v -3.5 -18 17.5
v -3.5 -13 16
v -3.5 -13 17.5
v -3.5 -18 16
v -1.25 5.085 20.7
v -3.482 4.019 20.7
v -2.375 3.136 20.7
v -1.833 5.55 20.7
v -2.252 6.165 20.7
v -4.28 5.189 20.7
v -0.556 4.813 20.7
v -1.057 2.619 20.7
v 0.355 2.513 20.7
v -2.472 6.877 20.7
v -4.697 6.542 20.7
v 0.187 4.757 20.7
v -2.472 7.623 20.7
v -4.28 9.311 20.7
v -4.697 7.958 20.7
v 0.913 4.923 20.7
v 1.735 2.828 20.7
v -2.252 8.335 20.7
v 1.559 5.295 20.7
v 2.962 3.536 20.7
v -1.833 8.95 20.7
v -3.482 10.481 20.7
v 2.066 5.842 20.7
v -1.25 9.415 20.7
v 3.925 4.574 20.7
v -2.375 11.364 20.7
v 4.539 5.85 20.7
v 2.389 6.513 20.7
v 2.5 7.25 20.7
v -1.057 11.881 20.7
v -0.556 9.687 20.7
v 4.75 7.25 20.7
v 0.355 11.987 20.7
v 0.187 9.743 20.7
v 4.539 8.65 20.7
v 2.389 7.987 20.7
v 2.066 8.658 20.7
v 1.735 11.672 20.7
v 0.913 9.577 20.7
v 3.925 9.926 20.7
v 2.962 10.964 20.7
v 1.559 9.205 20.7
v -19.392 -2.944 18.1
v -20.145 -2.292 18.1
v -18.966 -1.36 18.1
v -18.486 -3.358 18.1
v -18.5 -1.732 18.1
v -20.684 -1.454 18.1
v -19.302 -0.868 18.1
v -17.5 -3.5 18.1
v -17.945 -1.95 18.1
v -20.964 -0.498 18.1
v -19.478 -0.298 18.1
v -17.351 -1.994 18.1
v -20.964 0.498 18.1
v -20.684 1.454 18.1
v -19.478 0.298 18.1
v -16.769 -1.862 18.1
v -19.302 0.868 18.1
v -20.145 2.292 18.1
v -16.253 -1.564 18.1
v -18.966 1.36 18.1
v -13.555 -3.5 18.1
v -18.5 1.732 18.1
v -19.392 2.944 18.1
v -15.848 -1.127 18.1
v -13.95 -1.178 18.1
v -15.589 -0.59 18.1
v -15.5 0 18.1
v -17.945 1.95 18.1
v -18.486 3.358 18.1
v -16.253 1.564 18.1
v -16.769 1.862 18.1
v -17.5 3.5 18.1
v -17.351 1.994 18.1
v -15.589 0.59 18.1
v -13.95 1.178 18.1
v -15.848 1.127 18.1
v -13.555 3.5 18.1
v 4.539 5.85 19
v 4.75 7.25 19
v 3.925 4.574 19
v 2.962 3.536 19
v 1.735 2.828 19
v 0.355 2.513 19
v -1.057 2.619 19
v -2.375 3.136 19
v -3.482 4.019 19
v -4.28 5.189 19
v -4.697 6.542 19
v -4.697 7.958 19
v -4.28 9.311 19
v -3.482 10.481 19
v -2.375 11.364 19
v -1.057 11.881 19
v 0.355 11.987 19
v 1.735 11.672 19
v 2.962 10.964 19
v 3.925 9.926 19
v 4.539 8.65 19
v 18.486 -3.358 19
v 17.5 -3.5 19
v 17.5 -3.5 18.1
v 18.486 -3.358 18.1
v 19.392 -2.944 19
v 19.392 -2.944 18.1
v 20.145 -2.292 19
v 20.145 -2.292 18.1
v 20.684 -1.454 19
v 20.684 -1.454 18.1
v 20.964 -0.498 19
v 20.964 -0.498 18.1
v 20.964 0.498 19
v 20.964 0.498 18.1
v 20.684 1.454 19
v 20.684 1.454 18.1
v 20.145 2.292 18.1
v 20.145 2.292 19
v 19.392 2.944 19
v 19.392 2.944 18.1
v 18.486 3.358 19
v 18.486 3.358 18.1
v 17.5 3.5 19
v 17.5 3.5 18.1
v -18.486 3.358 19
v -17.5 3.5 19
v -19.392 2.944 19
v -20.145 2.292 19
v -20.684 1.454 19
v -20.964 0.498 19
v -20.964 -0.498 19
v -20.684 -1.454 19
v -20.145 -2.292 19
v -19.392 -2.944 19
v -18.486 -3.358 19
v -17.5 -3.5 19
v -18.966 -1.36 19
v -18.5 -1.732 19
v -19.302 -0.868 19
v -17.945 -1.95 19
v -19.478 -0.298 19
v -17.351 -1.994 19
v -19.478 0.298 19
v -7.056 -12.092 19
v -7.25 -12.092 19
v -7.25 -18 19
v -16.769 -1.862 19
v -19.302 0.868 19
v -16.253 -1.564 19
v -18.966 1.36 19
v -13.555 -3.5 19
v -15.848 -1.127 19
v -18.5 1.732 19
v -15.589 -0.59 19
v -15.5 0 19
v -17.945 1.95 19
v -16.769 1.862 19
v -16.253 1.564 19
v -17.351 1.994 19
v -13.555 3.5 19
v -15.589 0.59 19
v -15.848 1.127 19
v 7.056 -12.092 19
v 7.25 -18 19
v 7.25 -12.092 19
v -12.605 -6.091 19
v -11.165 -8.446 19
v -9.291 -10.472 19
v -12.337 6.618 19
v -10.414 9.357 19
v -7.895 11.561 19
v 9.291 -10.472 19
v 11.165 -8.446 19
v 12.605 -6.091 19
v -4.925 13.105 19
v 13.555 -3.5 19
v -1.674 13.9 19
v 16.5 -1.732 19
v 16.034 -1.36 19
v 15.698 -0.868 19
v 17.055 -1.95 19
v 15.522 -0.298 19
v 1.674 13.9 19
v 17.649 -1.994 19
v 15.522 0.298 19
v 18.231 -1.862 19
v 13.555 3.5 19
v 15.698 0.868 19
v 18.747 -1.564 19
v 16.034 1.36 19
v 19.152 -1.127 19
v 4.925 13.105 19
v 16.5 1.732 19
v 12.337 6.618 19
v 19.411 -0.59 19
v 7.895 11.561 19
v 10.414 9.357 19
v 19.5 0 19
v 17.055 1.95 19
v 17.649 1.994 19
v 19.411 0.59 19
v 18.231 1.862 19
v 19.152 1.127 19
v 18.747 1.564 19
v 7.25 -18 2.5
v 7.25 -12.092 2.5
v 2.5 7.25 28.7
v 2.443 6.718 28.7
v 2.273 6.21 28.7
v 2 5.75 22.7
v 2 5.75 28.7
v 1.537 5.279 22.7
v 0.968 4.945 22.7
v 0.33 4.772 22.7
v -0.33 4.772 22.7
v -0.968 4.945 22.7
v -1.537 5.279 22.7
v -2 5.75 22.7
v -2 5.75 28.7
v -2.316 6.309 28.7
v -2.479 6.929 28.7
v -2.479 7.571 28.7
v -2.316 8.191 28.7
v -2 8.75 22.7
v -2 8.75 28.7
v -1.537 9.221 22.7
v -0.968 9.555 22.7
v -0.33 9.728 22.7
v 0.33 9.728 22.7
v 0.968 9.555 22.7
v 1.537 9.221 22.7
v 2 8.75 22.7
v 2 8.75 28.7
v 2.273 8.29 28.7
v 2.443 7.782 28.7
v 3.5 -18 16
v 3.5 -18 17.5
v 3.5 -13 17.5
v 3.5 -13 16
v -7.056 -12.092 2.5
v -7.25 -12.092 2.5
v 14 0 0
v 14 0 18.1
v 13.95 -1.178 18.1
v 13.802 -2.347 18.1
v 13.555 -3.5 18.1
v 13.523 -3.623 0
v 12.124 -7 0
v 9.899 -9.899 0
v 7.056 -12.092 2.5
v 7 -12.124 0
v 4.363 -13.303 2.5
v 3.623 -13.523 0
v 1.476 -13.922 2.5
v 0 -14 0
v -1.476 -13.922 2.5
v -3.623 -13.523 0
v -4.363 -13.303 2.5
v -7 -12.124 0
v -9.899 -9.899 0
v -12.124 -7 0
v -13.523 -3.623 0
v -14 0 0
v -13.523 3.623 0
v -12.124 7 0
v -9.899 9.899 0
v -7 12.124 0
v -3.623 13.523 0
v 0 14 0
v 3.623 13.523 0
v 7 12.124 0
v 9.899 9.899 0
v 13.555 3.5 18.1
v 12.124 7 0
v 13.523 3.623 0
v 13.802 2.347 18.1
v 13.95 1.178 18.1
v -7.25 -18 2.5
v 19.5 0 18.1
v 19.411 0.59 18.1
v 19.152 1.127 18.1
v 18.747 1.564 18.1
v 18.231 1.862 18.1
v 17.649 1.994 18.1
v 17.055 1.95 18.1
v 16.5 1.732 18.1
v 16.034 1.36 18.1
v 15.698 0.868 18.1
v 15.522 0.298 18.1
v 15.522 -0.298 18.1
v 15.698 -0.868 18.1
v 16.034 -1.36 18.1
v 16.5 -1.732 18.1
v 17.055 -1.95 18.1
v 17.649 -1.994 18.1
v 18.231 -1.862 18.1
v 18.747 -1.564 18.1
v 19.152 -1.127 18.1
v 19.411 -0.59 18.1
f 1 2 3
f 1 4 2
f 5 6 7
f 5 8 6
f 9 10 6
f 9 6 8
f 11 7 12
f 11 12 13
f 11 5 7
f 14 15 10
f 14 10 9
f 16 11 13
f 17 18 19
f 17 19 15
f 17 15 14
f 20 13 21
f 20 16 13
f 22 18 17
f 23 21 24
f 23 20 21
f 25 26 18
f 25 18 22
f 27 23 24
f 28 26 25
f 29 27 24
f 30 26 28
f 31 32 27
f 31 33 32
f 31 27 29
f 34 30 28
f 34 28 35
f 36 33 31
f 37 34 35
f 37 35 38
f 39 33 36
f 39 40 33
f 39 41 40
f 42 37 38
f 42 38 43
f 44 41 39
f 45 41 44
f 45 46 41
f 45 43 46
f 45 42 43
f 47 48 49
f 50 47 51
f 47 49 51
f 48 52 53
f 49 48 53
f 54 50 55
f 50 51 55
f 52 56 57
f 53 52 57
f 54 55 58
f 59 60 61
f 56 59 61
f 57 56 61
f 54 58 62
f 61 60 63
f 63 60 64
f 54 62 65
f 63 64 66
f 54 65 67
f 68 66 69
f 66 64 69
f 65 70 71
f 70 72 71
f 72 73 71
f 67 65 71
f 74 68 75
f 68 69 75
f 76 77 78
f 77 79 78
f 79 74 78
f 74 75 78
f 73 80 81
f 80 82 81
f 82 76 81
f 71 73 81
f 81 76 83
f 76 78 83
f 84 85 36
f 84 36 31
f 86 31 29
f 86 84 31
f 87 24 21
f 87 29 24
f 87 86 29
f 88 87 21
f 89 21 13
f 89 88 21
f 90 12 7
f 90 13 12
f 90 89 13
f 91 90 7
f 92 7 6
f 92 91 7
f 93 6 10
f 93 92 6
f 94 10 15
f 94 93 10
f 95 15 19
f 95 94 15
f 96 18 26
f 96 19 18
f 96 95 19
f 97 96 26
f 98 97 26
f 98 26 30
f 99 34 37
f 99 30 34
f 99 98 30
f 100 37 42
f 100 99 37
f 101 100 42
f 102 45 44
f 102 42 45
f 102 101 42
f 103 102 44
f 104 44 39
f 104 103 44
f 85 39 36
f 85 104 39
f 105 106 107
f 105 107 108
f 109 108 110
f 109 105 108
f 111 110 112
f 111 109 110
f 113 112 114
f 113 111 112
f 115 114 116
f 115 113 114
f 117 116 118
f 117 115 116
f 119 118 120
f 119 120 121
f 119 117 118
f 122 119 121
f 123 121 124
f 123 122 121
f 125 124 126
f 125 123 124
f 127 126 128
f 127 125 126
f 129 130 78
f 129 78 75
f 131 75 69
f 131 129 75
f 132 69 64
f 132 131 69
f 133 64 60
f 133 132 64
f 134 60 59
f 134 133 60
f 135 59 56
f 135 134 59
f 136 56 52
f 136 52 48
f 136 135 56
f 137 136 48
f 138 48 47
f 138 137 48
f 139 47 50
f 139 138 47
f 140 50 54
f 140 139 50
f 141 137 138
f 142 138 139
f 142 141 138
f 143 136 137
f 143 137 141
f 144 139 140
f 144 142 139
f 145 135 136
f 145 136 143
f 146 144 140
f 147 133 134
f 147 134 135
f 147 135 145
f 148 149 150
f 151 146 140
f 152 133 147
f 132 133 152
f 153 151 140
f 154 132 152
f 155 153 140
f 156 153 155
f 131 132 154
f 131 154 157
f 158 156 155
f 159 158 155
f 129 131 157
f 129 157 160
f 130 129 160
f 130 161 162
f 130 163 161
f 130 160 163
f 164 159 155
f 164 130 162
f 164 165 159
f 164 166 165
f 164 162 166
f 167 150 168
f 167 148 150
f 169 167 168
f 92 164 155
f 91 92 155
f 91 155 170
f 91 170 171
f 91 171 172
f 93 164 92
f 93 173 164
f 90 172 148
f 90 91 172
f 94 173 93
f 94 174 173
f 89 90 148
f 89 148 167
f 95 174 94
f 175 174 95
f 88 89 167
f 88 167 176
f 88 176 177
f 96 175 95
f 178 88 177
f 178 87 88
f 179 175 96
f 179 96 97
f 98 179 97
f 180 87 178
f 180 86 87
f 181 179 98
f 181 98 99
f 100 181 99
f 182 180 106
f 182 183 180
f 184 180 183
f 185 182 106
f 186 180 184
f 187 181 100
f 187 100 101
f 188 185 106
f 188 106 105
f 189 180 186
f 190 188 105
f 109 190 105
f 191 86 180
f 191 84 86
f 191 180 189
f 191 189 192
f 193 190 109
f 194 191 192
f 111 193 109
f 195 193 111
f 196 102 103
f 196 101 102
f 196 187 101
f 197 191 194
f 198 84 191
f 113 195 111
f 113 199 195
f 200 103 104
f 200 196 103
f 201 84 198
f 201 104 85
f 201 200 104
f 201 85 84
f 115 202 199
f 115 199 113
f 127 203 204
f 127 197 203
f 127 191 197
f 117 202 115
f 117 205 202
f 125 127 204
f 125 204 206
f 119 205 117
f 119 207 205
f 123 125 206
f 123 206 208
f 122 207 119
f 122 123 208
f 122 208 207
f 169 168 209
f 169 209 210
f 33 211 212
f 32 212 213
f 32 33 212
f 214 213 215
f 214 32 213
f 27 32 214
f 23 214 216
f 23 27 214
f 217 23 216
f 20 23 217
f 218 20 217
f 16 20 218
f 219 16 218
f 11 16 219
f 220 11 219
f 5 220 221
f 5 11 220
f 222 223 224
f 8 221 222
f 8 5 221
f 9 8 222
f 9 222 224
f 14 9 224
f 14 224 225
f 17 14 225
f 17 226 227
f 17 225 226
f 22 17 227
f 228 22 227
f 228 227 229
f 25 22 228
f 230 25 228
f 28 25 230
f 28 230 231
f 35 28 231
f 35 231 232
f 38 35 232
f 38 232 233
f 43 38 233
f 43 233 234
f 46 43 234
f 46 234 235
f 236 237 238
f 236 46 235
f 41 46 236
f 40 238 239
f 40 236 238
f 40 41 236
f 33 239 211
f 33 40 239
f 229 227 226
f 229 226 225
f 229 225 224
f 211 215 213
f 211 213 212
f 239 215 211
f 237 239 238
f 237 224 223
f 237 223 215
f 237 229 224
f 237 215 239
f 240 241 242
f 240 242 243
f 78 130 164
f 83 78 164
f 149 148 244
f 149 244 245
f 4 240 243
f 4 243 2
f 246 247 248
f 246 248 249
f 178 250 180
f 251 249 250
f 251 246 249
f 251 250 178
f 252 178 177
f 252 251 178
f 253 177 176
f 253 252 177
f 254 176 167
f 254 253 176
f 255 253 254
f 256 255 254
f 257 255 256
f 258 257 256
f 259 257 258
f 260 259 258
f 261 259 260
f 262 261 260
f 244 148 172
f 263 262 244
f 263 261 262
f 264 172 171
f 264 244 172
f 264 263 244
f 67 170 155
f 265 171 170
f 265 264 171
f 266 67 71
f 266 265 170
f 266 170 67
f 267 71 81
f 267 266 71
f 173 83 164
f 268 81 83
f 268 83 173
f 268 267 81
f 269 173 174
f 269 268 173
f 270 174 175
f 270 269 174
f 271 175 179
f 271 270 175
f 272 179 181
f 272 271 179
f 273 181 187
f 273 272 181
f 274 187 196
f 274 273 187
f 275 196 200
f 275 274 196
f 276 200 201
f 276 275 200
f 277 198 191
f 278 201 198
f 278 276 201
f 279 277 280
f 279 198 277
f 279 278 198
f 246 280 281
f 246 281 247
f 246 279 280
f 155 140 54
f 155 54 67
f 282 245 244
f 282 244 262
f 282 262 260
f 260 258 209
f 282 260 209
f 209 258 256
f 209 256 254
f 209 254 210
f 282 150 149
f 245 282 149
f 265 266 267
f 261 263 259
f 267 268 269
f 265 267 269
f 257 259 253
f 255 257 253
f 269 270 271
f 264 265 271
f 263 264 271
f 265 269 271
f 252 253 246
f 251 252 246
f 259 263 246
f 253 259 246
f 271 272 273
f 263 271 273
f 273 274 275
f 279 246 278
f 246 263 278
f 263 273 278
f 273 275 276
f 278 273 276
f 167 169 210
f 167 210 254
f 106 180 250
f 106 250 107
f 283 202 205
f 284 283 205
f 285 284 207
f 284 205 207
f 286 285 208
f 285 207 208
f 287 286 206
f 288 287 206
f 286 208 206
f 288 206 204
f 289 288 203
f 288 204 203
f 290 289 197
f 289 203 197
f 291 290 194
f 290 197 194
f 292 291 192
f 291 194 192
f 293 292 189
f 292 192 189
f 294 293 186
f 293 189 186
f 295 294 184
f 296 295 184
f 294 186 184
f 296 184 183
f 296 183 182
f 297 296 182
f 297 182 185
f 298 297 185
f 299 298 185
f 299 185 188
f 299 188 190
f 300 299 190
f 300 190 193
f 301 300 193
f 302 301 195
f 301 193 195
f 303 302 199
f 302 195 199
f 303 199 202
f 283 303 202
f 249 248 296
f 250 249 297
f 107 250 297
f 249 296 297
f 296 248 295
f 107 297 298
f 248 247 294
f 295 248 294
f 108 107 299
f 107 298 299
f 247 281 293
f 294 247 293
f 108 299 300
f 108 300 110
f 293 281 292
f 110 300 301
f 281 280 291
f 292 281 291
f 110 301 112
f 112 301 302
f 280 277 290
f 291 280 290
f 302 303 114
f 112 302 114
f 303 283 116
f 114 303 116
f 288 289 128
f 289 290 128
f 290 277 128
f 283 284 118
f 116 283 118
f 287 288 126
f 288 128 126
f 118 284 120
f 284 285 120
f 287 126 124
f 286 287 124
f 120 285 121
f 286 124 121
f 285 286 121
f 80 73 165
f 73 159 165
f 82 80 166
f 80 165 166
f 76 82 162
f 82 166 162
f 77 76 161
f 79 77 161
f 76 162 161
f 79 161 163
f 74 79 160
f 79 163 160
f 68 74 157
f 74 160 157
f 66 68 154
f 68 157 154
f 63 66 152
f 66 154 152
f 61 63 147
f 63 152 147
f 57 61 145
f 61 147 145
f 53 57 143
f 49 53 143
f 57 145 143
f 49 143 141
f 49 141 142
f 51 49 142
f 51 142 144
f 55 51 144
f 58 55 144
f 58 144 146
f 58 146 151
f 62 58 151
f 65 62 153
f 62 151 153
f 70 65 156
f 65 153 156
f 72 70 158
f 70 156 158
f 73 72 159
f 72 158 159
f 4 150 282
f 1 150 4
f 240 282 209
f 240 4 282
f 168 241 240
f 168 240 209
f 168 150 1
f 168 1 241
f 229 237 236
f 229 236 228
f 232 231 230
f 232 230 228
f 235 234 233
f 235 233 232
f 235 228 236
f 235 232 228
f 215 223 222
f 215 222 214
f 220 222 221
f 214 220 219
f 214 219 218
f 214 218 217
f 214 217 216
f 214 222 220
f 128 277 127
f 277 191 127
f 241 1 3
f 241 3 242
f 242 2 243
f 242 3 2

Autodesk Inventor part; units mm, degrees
ref_plane "YZ Plane" through (0, 0, 0) normal (1, 0, 0) x (0, 1, 0)
ref_plane "XZ Plane" through (0, 0, 0) normal (0, 1, 0) x (-1, 0, 0)
ref_plane "XY Plane" through (0, 0, 0) normal (0, 0, 1) x (1, 0, 0)
sketch "スケッチ1" plane through (0, 0, 0) normal (0, 0, 1) x (1, 0, 0)
  circle A0 centre (0, 0) radius 14
  dimension "d0" = 28
extrude "押し出し1" add sketch "スケッチ1" along normal blind 19
sketch "スケッチ2" plane through (0, 0, 19) normal (0, 0, 1) x (1, 0, 0)
  circle A0 centre (0, 0) radius 14 projected
  arc A1 (-17.5, 3.5) -> (-17.5, -3.5) centre (-17.5, 0) ccw
  arc A2 (17.5, -3.5) -> (17.5, 3.5) centre (17.5, 0) ccw
  line L0 (-17.5, 3.5) -> (-13.5554, 3.5)
  line L1 (-17.5, -3.5) -> (-13.5554, -3.5)
  line L2 (13.5554, 3.5) -> (17.5, 3.5)
  line L3 (13.5554, -3.5) -> (17.5, -3.5)
  circle A3 centre (-17.5, 0) radius 2
  circle A4 centre (17.5, 0) radius 2
  dimension "d5" = 7
  dimension "d6" = 7
  dimension "d7" = 4
  dimension "d8" = 4
extrude "押し出し2" add sketch "スケッチ2" against normal blind 0.9 contours A0 L2 A2 L3 | A0 L1 A1 L0
sketch "スケッチ3" plane through (0, 0, 19) normal (0, 0, 1) x (1, 0, 0)
  line L0 (-7.25, -14) -> (-7.25, -18)
  line L1 (-7.25, -18) -> (7.25, -18)
  line L2 (7.25, -18) -> (7.25, -14)
  line L3 (-7.25, -14) -> (-7.25, -12.0918)
  line L4 (7.25, -14) -> (7.25, -12.0918)
  circle A0 centre (-17.5, 0) radius 2 projected
  circle A1 centre (17.5, 0) radius 2 projected
  arc A2 (13.5554, 3.5) -> (-13.5554, 3.5) centre (0, 0) ccw projected
  line L5 (-13.5554, 3.5) -> (-17.5, 3.5) projected
  arc A3 (-17.5, 3.5) -> (-17.5, -3.5) centre (-17.5, 0) ccw projected
  line L6 (-17.5, -3.5) -> (-13.5554, -3.5) projected
  arc A4 (-13.5554, -3.5) -> (13.5554, -3.5) centre (0, 0) ccw projected
  line L7 (13.5554, -3.5) -> (17.5, -3.5) projected
  arc A5 (17.5, -3.5) -> (17.5, 3.5) centre (17.5, 0) ccw projected
  line L8 (17.5, 3.5) -> (13.5554, 3.5) projected
  line L9 (7.25, -12.0918) -> (-7.25, -12.0918)
  line L10 (-7.25, -12.0918) -> (-7.25, -18)
  line L11 (-7.25, -18) -> (7.25, -18)
  line L12 (7.25, -18) -> (7.25, -12.0918)
extrude "押し出し3" add sketch "スケッチ3" against normal blind 16.5 contours L3 L9 A4 L4 L2 L1 L0 | L9 A4
sketch "スケッチ4" plane through (0, 0, 19) normal (0, 0, 1) x (1, 0, 0)
  arc A0 (7.056, -12.0918) -> (13.5554, -3.5) centre (0, 0) ccw projected
  line L0 (13.5554, -3.5) -> (17.5, -3.5) projected
  arc A1 (17.5, -3.5) -> (17.5, 3.5) centre (17.5, 0) ccw projected
  line L1 (17.5, 3.5) -> (13.5554, 3.5) projected
  arc A2 (13.5554, 3.5) -> (-13.5554, 3.5) centre (0, 0) ccw projected
  line L2 (-13.5554, 3.5) -> (-17.5, 3.5) projected
  arc A3 (-17.5, 3.5) -> (-17.5, -3.5) centre (-17.5, 0) ccw projected
  line L3 (-17.5, -3.5) -> (-13.5554, -3.5) projected
  arc A4 (-13.5554, -3.5) -> (-7.056, -12.0918) centre (0, 0) ccw projected
  line L4 (-7.25, -12.0918) -> (-7.056, -12.0918) projected
  line L5 (-7.25, -18) -> (-7.25, -12.0918) projected
  line L6 (7.25, -18) -> (-7.25, -18) projected
  line L7 (7.25, -12.0918) -> (7.25, -18) projected
  line L8 (7.056, -12.0918) -> (7.25, -12.0918) projected
  circle A5 centre (-17.5, 0) radius 2 projected
  circle A6 centre (17.5, 0) radius 2 projected
  circle A7 centre (0, 7.25) radius 4.75
  dimension "d15" = 9.5
extrude "押し出し4" add sketch "スケッチ4" along normal blind 1.7 contours A7
sketch "スケッチ5" plane through (0, 7.25, 20.7) normal (0, 0, 1) x (1, 0, 0)
  circle A0 centre (0, 0) radius 2.5
  point P0 (0, -7.25)
  dimension "d18" = 5
extrude "押し出し5" add sketch "スケッチ5" along normal blind 8
sketch "スケッチ6" plane through (0, 7.25, 28.7) normal (0, 0, 1) x (1, 0, 0)
  circle A0 centre (0, 0) radius 2.5 projected
  line L0 (2, 1.5) -> (-2, 1.5)
  line L1 (-2, -1.5) -> (2, -1.5)
  circle A1 centre (0, 0) radius 2.5
  point P0 (0, -7.25)
  dimension "d23" = 5
extrude "押し出し6" cut sketch "スケッチ6" against normal blind 6 contours L0 A0 | A0 L1
sketch "スケッチ7" plane through (-7.25, -18, 19) normal (0, -1, 0) x (1, 0, 0)
  line L0 (3.75, -1.5) -> (10.75, -1.5)
  line L1 (10.75, -1.5) -> (10.75, -3)
  line L2 (10.75, -3) -> (3.75, -3)
  line L3 (3.75, -3) -> (3.75, -1.5)
  point P0 (7.25, -19)
  dimension "d26" = 7
  dimension "d27" = 1.5
extrude "押し出し7" cut sketch "スケッチ7" against normal blind 5
sketch "スケッチ8" plane through (0, 0, 19) normal (0, 0, 1) x (1, 0, 0)
  circle A0 centre (0, 7.25) radius 4.75 projected
  arc A1 (7.056, -12.0918) -> (13.5554, -3.5) centre (0, 0) ccw projected
  line L0 (13.5554, -3.5) -> (17.5, -3.5) projected
  arc A2 (17.5, -3.5) -> (17.5, 3.5) centre (17.5, 0) ccw projected
  line L1 (17.5, 3.5) -> (13.5554, 3.5) projected
  arc A3 (13.5554, 3.5) -> (-13.5554, 3.5) centre (0, 0) ccw projected
  line L2 (-13.5554, 3.5) -> (-17.5, 3.5) projected
  arc A4 (-17.5, 3.5) -> (-17.5, -3.5) centre (-17.5, 0) ccw projected
  line L3 (-17.5, -3.5) -> (-13.5554, -3.5) projected
  arc A5 (-13.5554, -3.5) -> (-7.056, -12.0918) centre (0, 0) ccw projected
  line L4 (-7.25, -12.0918) -> (-7.056, -12.0918) projected
  line L5 (-7.25, -18) -> (-7.25, -12.0918) projected
  line L6 (7.25, -18) -> (-7.25, -18) projected
  line L7 (7.25, -12.0918) -> (7.25, -18) projected
  line L8 (7.056, -12.0918) -> (7.25, -12.0918) projected
  circle A6 centre (-17.5, 0) radius 2 projected
  circle A7 centre (17.5, 0) radius 2 projected
sketch "スケッチ9" plane through (0, 0, 19) normal (0, 0, 1) x (1, 0, 0)
  circle A0 centre (-17.5, 0) radius 2 projected
  circle A1 centre (-17.5, 0) radius 2
  circle A2 centre (0, 7.25) radius 4.75 projected
  circle A3 centre (0, 7.25) radius 4.75
  circle A4 centre (17.5, 0) radius 2 projected
  circle A5 centre (17.5, 0) radius 2
  point P0 (0, 0)
properties part number "28BYJ-48" material "鋼"
